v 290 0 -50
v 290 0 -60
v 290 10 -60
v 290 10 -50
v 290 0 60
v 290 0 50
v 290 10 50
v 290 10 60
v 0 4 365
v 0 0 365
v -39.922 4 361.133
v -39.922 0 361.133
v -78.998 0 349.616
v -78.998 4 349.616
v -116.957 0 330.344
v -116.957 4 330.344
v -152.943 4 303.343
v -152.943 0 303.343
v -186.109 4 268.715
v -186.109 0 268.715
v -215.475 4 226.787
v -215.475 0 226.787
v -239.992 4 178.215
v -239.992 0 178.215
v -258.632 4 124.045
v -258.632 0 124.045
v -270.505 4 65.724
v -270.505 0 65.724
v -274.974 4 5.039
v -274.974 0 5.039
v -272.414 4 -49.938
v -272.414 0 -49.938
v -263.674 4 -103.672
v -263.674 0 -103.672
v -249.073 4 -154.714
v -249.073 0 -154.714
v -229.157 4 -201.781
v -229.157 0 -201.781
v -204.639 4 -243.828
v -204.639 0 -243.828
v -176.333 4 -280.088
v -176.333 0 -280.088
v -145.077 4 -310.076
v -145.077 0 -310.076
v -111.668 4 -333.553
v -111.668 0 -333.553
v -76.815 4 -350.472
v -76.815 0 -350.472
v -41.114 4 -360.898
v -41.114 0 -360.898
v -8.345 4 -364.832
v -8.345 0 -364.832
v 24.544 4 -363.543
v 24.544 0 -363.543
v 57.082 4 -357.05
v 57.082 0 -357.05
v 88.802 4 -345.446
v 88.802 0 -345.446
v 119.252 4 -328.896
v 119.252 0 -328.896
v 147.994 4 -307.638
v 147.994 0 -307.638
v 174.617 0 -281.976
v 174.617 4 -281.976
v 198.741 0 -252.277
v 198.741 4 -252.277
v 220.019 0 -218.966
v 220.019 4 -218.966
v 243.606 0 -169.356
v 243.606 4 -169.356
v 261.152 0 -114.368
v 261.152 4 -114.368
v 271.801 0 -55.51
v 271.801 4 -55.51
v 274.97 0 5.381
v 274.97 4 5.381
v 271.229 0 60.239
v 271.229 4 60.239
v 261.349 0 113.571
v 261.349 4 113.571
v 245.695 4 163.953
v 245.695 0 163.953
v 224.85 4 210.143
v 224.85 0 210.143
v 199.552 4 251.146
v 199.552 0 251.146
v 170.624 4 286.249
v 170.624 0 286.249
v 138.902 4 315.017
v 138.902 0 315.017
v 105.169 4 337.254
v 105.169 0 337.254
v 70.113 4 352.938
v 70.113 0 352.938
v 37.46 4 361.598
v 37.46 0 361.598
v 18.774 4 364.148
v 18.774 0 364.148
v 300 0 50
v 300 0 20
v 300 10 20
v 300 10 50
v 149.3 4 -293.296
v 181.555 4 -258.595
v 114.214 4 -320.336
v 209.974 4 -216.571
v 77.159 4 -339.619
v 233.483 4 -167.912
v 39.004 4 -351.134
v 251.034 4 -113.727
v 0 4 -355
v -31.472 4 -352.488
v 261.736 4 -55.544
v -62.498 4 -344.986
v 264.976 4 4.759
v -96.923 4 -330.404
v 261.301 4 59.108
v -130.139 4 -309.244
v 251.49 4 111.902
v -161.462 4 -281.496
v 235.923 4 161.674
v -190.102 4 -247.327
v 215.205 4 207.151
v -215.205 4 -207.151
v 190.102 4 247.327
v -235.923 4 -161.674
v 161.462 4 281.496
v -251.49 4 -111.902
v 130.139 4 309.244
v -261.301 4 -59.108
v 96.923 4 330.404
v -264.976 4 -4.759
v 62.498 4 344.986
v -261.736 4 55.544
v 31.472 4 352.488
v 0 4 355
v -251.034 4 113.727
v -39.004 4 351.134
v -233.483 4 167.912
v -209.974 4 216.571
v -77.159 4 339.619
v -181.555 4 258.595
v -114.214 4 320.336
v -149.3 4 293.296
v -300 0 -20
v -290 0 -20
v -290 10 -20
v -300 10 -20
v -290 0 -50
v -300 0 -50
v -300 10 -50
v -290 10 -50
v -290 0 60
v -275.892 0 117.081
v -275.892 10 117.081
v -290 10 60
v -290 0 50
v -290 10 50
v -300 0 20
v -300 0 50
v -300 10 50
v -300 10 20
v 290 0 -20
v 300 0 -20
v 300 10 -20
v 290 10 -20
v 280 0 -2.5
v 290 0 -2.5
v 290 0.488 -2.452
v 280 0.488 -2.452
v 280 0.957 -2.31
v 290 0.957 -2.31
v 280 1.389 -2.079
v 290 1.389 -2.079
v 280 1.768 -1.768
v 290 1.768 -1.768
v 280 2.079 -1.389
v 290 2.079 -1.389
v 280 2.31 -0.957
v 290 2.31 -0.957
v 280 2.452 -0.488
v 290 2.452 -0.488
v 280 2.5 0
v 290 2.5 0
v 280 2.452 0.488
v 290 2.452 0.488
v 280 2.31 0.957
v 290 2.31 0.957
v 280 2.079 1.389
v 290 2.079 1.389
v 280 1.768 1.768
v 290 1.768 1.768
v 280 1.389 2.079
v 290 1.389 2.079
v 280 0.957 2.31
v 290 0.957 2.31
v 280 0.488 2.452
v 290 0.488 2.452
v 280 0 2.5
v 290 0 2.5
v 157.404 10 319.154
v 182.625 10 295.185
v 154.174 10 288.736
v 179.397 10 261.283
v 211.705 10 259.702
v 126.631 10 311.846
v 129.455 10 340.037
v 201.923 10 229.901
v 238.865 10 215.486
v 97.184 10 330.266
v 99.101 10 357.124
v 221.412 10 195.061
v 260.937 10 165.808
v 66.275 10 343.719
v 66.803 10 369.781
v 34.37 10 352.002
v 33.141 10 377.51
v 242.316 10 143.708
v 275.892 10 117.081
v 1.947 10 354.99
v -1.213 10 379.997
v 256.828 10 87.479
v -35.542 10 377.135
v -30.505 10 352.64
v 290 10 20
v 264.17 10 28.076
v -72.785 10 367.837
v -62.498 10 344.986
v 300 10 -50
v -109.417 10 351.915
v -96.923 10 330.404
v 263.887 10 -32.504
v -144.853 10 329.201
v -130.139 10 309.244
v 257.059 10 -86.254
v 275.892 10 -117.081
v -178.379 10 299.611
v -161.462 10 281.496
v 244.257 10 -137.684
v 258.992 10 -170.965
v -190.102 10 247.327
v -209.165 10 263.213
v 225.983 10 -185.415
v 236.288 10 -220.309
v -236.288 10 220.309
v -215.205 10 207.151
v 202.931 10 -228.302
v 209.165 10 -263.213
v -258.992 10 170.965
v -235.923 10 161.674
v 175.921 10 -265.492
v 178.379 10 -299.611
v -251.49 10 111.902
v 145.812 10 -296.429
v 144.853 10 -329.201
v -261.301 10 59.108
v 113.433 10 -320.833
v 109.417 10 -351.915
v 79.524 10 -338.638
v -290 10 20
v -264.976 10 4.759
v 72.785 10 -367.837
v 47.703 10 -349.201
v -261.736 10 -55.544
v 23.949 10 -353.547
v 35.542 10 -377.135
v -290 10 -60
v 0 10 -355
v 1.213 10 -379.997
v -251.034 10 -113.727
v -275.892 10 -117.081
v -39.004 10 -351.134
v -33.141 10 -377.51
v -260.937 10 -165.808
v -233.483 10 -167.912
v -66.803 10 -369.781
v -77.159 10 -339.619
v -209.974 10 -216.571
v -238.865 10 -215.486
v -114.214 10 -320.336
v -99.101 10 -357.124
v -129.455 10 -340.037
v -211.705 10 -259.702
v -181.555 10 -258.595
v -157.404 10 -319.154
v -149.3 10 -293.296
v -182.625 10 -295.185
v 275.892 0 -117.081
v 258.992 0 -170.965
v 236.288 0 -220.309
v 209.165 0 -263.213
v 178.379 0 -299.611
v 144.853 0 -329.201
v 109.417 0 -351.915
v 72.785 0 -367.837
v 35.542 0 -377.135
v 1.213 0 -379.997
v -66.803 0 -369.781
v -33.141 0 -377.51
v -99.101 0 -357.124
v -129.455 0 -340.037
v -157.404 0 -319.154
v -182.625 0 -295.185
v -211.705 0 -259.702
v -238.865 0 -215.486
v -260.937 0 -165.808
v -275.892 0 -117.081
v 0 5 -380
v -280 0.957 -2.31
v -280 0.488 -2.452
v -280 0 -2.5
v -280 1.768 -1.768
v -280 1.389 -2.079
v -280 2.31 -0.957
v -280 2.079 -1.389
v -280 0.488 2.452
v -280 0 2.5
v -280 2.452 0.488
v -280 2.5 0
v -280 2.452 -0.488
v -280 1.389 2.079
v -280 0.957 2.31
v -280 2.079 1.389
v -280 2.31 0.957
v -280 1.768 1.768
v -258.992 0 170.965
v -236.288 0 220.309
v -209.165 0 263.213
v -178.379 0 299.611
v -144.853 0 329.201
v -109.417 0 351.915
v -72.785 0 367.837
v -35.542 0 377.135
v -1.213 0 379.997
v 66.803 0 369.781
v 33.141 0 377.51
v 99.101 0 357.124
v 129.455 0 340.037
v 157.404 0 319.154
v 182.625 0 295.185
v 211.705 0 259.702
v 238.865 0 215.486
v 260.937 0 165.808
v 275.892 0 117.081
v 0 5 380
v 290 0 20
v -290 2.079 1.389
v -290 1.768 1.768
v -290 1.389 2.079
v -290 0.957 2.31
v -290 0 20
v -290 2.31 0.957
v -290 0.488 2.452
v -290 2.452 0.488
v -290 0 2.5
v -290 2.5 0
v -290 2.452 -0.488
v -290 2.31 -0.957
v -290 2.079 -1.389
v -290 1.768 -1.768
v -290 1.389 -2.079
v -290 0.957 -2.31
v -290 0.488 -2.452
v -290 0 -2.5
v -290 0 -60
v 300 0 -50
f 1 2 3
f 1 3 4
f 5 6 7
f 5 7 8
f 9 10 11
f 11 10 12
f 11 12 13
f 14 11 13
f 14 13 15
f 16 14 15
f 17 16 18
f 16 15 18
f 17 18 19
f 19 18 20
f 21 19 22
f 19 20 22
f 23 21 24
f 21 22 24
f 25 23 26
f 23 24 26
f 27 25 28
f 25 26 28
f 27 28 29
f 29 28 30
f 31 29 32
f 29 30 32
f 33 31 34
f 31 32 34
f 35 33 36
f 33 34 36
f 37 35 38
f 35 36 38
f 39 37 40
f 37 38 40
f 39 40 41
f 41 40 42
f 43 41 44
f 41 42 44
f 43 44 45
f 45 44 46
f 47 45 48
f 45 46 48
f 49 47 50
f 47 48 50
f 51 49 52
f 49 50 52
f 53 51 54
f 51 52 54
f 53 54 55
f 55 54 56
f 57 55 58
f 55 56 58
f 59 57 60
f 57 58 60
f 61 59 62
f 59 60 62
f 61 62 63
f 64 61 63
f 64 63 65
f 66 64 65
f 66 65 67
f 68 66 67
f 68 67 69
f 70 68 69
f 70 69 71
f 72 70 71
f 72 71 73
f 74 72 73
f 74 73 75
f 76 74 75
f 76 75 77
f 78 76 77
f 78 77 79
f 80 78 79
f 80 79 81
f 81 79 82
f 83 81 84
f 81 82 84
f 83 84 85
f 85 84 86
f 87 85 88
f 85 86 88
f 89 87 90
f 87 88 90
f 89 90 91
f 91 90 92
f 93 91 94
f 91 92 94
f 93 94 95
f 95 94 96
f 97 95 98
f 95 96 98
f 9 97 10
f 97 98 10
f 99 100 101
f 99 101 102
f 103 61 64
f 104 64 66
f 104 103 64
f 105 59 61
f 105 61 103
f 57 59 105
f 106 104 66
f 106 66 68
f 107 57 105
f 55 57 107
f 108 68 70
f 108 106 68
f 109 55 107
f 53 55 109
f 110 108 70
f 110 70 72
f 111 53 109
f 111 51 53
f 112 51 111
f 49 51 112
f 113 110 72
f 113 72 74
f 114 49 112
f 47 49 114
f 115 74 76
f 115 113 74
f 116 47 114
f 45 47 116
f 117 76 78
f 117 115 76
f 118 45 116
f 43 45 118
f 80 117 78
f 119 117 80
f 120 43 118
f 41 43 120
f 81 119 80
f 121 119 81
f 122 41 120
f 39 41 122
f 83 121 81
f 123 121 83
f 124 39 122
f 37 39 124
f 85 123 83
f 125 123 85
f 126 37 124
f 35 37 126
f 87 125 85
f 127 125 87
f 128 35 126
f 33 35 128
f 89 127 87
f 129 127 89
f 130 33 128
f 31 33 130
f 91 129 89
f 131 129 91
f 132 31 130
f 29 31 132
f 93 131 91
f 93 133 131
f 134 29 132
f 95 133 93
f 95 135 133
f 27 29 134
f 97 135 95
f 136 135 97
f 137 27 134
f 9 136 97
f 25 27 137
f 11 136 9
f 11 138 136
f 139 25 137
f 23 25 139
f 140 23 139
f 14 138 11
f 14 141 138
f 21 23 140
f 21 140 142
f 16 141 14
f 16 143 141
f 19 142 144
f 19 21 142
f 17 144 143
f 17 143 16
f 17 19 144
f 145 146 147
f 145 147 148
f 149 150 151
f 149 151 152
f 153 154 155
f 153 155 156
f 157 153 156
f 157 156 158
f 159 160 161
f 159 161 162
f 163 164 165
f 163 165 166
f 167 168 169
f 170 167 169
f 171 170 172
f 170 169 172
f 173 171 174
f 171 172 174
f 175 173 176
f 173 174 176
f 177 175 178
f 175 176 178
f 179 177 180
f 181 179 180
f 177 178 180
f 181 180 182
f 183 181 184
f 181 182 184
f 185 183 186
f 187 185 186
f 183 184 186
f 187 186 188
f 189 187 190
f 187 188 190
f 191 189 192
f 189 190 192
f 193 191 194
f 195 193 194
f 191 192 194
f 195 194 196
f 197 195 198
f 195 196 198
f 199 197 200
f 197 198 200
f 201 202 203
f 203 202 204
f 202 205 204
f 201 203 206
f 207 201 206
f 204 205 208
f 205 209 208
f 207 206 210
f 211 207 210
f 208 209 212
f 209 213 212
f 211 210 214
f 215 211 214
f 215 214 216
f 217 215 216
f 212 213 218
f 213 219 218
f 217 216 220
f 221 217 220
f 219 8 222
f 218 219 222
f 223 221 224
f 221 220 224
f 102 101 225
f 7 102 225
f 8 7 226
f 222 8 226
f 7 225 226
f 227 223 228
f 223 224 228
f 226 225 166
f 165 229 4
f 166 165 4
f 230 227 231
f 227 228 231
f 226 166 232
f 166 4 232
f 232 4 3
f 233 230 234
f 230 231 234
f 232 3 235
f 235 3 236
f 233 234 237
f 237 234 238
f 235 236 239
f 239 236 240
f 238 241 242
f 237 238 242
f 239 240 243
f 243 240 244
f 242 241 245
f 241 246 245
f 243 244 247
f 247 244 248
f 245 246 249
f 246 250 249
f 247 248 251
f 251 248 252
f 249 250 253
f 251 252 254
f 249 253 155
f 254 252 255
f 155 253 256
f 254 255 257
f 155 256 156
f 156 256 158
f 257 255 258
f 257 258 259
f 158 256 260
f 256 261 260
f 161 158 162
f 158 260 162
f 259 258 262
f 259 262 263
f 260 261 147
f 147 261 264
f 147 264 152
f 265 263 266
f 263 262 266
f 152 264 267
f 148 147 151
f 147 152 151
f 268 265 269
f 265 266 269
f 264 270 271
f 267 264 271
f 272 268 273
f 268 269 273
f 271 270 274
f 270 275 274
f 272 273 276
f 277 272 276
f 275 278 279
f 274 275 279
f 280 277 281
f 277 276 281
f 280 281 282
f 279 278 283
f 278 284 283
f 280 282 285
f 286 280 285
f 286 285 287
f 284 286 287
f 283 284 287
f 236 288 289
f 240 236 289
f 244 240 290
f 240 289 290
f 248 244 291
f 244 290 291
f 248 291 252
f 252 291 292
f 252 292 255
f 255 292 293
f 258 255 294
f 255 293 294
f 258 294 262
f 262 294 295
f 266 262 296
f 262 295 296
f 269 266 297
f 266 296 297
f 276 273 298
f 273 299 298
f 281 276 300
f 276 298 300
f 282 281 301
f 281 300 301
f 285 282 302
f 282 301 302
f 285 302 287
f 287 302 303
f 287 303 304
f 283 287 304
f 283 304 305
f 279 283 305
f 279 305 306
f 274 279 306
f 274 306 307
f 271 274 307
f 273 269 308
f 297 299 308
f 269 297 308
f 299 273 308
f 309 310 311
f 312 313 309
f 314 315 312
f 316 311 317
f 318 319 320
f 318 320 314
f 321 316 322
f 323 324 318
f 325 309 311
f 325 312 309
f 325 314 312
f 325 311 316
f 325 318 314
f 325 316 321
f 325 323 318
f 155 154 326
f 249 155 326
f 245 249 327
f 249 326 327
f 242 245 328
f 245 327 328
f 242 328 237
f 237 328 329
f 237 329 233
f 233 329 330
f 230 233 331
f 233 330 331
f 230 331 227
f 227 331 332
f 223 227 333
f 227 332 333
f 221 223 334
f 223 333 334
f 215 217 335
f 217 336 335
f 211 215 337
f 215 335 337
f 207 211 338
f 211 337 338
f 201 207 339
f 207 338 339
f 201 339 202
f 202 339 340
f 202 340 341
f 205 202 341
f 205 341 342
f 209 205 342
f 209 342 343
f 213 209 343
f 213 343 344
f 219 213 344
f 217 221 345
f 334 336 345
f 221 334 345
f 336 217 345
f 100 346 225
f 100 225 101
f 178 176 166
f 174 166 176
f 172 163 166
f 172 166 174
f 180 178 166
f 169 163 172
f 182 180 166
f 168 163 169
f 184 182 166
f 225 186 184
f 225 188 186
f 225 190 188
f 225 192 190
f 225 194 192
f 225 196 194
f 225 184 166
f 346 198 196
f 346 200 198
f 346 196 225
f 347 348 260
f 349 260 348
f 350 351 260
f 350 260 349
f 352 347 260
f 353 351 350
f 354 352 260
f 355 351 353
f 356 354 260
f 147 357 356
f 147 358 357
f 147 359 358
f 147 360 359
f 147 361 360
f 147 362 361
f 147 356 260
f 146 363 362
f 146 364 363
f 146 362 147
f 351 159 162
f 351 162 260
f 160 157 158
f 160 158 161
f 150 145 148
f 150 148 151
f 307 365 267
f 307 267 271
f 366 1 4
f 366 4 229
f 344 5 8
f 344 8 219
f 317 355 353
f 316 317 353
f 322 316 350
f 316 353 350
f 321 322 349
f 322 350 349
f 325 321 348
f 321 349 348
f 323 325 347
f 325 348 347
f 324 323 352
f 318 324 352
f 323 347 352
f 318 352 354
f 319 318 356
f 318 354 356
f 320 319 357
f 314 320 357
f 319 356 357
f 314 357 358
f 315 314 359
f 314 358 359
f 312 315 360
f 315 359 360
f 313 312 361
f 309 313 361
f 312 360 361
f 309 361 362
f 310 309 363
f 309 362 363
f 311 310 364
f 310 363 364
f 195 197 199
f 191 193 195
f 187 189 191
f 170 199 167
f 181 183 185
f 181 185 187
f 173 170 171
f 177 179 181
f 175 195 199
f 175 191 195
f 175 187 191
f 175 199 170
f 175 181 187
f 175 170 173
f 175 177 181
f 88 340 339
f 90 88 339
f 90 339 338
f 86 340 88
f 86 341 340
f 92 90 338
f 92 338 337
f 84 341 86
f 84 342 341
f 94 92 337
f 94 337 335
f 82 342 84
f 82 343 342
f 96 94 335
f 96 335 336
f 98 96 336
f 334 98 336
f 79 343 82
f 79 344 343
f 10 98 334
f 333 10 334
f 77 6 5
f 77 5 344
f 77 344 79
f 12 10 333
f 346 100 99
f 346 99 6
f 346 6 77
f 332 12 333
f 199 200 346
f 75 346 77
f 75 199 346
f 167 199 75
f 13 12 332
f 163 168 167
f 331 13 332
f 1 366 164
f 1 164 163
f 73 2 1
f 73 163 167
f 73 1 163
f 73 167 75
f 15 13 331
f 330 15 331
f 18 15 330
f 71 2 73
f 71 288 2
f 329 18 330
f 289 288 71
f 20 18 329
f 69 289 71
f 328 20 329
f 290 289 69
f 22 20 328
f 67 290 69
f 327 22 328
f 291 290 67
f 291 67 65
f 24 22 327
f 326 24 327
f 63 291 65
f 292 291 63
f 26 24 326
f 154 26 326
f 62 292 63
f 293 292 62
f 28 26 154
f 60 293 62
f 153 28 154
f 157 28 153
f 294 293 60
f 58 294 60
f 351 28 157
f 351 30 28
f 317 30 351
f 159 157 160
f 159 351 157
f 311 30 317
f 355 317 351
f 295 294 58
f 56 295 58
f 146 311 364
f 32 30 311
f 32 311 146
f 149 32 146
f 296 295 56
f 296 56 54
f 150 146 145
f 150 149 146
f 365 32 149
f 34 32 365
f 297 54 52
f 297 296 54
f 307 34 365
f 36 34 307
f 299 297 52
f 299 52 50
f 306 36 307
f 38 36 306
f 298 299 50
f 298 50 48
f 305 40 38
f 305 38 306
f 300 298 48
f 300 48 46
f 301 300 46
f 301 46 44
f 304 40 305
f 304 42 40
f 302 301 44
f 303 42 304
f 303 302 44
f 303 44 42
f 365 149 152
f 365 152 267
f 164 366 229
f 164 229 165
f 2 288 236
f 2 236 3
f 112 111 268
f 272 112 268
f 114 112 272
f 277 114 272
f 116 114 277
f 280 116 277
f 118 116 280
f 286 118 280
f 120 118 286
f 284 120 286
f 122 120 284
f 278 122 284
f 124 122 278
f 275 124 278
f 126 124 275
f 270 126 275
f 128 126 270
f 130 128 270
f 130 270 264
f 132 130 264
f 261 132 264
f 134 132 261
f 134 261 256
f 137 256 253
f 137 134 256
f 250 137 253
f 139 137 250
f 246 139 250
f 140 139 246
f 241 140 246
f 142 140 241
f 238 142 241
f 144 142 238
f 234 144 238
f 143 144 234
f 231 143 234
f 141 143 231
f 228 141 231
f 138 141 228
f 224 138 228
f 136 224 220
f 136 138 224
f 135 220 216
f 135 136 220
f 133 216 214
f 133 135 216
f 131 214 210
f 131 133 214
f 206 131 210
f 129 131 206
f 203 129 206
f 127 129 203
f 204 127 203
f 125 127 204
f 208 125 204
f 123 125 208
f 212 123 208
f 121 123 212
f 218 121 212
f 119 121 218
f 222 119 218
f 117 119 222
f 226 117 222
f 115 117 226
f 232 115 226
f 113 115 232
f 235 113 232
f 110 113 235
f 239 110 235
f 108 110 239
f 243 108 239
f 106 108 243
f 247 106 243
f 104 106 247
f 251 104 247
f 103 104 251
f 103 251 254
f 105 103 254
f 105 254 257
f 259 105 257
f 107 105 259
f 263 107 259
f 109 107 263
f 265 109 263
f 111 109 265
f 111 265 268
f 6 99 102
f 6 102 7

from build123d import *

# Parameters (mm, degrees)
SKETCH1_RX          = 355
SKETCH1_RY          = 265
BOSS_EXTRUDE1_DEPTH = 10
SKETCH2_RX          = 365
SKETCH2_RY          = 275
SKETCH2_RX_2        = 355
SKETCH2_RY_2        = 265
CUT_EXTRUDE1_DEPTH  = 4
CUT_EXTRUDE4_DEPTH  = 10
CUT_EXTRUDE5_DEPTH  = 10


with BuildPart() as part:
    # Sketch1 → Boss-Extrude1 (new body)
    with BuildSketch(Plane(origin=(0, 0, 0), x_dir=(1, 0, 0), z_dir=(0, 1, 0))):
        with BuildLine():
            Line((-290, 60), (-275.891891892, 117.081081081))
            add(Edge.make_bspline(
                [(275.891891892, 117.081081081), (0, 1233.333333333), (-275.891891892, 117.081081081)],
                knots=[5.025592734, 5.025592734, 5.025592734, 7.54077788, 7.54077788, 7.54077788], degree=2, weights=[1, 0.308108108, 1]))
            Line((275.891891892, 117.081081081), (290, 60))
            Line((290, 60), (290, 50))
            Line((290, 50), (300, 50))
            Line((300, 50), (300, 20))
            Line((300, 20), (290, 20))
            Line((290, 20), (290, -20))
            Line((290, -20), (300, -20))
            Line((300, -20), (300, -50))
            Line((300, -50), (290, -50))
            Line((290, -50), (290, -60))
            Line((290, -60), (275.891891892, -117.081081081))
            add(Edge.make_bspline(
                [(-275.891891892, -117.081081081), (0, -1233.333333333), (275.891891892, -117.081081081)],
                knots=[5.025592734, 5.025592734, 5.025592734, 7.54077788, 7.54077788, 7.54077788], degree=2, weights=[1, 0.308108108, 1]))
            Line((-275.891891892, -117.081081081), (-290, -60))
            Line((-290, -60), (-290, -50))
            Line((-290, -50), (-300, -50))
            Line((-300, -50), (-300, -20))
            Line((-300, -20), (-290, -20))
            Line((-290, -20), (-290, 20))
            Line((-290, 20), (-300, 20))
            Line((-300, 20), (-300, 50))
            Line((-300, 50), (-290, 50))
            Line((-290, 50), (-290, 60))
        make_face()
        with Locations(Location((0, 0), (0, 0, 90))):
            Ellipse(SKETCH1_RX, SKETCH1_RY, mode=Mode.SUBTRACT)
    extrude(amount=BOSS_EXTRUDE1_DEPTH)

    # Sketch2 → Cut-Extrude1 (cut)
    with BuildSketch(Plane.XZ):
        with Locations(Location((0, 0), (0, 0, 90))):
            Ellipse(SKETCH2_RX, SKETCH2_RY)
        with Locations(Location((0, 0), (0, 0, 90))):
            Ellipse(SKETCH2_RX_2, SKETCH2_RY_2, mode=Mode.SUBTRACT)
    extrude(amount=-CUT_EXTRUDE1_DEPTH, mode=Mode.SUBTRACT)

    # Sketch4 → Cut-Extrude4 (cut)
    with BuildSketch(Plane.ZY.offset(290)):
        with BuildLine():
            Line((-2.5, 0), (2.5, 0))
            ThreePointArc((2.5, 0), (0, 2.5), (-2.5, 0))
        make_face()
    extrude(amount=-CUT_EXTRUDE4_DEPTH, mode=Mode.SUBTRACT)

    # Sketch5 → Cut-Extrude5 (cut)
    with BuildSketch(Plane(origin=(290, 0, 0), x_dir=(0, 0, -1), z_dir=(1, 0, 0))):
        with BuildLine():
            Line((-2.5, 0), (2.5, 0))
            ThreePointArc((2.5, 0), (0, 2.5), (-2.5, 0))
        make_face()
    extrude(amount=-CUT_EXTRUDE5_DEPTH, mode=Mode.SUBTRACT)


solid = part.part
